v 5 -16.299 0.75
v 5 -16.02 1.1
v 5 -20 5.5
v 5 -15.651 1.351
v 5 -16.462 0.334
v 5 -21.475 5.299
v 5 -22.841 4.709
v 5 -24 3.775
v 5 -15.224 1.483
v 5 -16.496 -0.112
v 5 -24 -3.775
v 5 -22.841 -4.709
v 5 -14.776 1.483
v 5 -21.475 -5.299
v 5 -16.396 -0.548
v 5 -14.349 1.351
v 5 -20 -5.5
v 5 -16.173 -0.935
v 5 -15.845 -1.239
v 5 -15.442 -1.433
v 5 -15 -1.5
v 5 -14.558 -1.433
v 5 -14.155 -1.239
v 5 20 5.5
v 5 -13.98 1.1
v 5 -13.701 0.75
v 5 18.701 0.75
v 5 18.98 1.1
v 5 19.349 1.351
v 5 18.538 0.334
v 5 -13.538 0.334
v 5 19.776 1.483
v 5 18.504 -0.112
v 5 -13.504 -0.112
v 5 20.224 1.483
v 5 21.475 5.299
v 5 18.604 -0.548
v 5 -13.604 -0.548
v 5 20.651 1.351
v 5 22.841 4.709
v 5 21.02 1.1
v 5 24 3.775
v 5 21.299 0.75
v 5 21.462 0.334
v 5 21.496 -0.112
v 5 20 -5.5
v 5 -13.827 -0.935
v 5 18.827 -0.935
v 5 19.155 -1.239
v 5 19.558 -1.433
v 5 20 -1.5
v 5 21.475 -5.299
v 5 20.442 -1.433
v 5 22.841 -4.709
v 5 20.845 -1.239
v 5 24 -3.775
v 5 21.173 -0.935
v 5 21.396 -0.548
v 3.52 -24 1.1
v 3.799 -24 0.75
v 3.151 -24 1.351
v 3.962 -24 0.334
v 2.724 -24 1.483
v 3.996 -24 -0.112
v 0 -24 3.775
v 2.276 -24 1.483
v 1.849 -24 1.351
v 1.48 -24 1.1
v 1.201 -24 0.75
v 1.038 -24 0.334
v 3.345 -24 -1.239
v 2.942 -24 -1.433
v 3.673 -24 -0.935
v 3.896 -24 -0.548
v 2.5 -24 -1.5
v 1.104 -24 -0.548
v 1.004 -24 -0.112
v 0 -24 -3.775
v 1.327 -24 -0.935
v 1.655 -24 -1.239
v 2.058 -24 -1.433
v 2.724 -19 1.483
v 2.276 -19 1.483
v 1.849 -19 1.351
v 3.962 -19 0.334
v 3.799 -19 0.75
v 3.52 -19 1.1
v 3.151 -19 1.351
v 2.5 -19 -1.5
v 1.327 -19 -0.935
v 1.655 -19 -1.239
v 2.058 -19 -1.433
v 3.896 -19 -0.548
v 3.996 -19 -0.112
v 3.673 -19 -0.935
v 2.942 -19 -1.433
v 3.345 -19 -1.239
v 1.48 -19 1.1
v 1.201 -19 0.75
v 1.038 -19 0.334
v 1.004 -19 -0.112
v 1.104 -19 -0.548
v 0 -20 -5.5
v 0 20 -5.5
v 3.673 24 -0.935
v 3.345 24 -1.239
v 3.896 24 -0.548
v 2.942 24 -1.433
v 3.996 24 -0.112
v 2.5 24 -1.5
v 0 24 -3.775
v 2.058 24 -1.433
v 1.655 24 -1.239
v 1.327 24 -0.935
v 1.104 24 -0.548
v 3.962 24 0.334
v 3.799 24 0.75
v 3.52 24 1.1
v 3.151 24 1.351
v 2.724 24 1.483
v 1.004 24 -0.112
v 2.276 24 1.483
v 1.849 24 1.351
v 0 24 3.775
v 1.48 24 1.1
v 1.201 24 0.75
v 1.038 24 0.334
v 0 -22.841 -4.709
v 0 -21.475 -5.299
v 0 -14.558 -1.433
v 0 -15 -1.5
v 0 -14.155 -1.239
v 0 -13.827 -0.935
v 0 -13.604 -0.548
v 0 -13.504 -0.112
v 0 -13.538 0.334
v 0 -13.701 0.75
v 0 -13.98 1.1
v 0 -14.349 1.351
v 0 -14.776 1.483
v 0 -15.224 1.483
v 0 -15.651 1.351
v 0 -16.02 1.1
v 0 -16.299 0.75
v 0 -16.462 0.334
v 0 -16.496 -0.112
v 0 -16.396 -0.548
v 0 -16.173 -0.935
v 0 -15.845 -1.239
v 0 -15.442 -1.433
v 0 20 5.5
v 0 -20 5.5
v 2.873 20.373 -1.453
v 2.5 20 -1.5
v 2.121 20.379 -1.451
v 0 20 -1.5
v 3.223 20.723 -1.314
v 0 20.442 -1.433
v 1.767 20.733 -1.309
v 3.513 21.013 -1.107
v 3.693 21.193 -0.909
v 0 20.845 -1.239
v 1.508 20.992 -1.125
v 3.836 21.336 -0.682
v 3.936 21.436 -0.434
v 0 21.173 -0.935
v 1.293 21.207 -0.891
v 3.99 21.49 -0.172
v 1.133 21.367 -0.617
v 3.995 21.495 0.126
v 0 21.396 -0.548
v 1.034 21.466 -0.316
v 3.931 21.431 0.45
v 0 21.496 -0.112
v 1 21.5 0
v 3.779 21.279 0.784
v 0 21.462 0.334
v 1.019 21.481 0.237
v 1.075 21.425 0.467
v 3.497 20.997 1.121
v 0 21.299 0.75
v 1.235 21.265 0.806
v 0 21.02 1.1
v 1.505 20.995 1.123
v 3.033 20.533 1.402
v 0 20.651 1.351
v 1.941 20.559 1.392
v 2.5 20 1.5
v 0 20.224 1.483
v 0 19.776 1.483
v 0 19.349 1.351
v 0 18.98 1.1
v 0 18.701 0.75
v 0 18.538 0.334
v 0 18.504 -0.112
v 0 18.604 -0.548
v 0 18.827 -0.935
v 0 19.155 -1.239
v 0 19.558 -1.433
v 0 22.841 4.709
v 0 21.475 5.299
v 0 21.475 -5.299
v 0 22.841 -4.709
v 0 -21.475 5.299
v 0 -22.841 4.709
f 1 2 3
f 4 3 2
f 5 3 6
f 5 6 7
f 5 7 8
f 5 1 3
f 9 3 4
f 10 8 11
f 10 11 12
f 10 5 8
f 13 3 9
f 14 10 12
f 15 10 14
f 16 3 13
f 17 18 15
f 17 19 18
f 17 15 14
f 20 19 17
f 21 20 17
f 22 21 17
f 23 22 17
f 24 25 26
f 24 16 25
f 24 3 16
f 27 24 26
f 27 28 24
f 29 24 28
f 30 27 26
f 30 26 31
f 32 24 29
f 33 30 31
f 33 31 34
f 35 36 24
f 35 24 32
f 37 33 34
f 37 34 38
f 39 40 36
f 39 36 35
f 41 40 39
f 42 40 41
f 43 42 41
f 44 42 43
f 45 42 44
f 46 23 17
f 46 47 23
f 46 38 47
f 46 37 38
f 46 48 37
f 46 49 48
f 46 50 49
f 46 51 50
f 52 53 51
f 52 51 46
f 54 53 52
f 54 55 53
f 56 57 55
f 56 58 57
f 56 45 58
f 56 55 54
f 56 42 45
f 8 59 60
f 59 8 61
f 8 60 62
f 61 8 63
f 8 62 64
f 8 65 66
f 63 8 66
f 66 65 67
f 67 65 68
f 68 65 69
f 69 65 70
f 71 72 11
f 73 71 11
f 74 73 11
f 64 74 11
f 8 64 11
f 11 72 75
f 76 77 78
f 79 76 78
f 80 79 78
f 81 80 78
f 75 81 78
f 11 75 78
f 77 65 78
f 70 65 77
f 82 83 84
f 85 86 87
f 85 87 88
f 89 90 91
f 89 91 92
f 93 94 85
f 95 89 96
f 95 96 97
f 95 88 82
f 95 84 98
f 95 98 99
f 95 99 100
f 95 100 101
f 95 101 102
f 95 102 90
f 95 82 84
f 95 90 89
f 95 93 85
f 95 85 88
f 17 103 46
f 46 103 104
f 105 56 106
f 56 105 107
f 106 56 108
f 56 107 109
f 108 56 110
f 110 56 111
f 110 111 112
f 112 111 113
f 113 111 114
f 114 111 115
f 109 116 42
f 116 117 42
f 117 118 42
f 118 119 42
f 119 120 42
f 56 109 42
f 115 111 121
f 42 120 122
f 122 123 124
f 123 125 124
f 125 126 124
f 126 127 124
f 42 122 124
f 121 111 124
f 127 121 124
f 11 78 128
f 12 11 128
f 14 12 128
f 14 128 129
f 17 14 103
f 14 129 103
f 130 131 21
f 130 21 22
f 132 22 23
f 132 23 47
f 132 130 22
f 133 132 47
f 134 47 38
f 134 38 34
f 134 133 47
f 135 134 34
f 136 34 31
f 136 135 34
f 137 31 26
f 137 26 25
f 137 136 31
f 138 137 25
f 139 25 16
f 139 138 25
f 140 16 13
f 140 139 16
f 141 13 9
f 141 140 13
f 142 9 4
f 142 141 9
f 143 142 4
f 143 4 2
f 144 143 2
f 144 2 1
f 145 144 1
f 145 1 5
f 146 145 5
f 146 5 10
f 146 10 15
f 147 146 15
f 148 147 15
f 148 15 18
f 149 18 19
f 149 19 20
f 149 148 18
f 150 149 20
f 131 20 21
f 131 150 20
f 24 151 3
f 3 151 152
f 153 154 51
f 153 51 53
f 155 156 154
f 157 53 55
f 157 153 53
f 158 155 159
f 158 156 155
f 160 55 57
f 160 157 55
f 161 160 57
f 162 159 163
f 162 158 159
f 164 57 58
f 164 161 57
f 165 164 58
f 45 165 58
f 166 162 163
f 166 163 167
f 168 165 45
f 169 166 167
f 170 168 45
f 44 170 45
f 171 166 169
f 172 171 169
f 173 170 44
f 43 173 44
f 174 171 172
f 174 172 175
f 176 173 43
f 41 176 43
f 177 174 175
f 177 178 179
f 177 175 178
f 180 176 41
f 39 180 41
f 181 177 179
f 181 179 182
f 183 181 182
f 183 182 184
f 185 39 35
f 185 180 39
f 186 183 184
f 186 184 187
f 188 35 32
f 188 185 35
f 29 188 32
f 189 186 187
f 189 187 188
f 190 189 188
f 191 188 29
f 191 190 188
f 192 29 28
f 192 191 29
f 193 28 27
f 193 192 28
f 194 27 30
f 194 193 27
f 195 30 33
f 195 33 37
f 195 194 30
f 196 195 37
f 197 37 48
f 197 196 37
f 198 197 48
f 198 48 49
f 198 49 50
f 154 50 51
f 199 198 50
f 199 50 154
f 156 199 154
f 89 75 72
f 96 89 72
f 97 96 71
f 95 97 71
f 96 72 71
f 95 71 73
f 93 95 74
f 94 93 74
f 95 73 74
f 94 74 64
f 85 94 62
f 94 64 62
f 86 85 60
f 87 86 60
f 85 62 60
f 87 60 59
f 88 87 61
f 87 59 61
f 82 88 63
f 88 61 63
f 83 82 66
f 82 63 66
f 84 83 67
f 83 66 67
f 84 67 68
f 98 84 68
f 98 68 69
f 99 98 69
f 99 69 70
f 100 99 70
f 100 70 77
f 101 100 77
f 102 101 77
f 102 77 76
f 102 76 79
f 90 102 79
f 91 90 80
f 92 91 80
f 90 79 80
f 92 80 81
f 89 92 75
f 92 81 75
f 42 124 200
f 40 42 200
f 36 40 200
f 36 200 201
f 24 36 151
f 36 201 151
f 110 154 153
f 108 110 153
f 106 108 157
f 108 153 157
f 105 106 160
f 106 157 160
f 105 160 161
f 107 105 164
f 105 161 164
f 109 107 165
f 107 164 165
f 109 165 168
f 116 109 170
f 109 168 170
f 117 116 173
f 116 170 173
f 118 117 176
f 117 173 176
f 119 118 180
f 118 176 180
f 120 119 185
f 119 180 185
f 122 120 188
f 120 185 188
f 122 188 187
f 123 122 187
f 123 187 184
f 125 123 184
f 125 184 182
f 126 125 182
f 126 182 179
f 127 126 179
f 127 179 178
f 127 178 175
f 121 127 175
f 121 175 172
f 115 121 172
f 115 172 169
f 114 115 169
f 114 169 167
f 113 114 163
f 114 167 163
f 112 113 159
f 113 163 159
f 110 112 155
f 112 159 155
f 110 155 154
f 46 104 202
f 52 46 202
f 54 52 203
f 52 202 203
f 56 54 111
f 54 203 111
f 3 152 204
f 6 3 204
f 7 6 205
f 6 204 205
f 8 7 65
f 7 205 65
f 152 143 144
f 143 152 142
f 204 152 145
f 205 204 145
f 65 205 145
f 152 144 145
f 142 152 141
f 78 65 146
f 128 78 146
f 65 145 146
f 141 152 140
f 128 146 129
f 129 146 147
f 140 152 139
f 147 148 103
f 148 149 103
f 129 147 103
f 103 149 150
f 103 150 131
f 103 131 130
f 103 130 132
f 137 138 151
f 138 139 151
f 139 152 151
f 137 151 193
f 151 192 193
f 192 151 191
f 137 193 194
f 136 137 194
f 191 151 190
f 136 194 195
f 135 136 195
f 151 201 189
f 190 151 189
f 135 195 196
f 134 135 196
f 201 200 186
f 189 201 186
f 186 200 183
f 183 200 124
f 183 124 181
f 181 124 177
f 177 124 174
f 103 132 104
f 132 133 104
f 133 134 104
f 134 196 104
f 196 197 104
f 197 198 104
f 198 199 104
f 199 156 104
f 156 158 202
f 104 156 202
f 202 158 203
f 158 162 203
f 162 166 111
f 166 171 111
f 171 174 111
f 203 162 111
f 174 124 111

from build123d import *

# Parameters (mm, degrees)
SKETCH1_R           = 1.5
BOSS_EXTRUDE1_DEPTH = 5
SKETCH2_R           = 1.5
CUT_EXTRUDE1_DEPTH  = 5
CUT_EXTRUDE2_START  = -44
SKETCH2_2_R         = 1.5
CUT_EXTRUDE2_DEPTH  = 4


with BuildPart() as part:
    # Sketch1 → Boss-Extrude1 (new body)
    with BuildSketch(Plane(origin=(0, 0, 0), x_dir=(0, 0, -1), z_dir=(1, 0, 0))):
        with BuildLine():
            Line((-5.5, 20), (-5.5, -20))
            ThreePointArc((-5.5, -20), (-5.050348735, -22.178067412), (-3.774917218, -24))
            Line((-3.774917218, -24), (3.774917218, -24))
            ThreePointArc((3.774917218, -24), (5.050348735, -22.178067412), (5.5, -20))
            Line((5.5, -20), (5.5, 20))
            ThreePointArc((5.5, 20), (5.050348735, 22.178067412), (3.774917218, 24))
            Line((3.774917218, 24), (-3.774917218, 24))
            ThreePointArc((-3.774917218, 24), (-5.050348735, 22.178067412), (-5.5, 20))
        make_face()
        with Locations((0, 20)):
            Circle(SKETCH1_R, mode=Mode.SUBTRACT)
        with Locations((0, -15)):
            Circle(SKETCH1_R, mode=Mode.SUBTRACT)
    extrude(amount=BOSS_EXTRUDE1_DEPTH)

    # Sketch2 → Cut-Extrude1 (cut)
    with BuildSketch(Plane.XZ.offset(24)):
        with Locations(Location((2.5, 0, 0), (0, 0, 270))):
            Circle(SKETCH2_R)
    extrude(amount=-CUT_EXTRUDE1_DEPTH, mode=Mode.SUBTRACT)

    # Sketch2<2> → Cut-Extrude2 (cut)
    with BuildSketch(Plane.XZ.offset(24).offset(CUT_EXTRUDE2_START)):
        with Locations(Location((2.5, 0, 0), (0, 0, 270))):
            Circle(SKETCH2_2_R)
    extrude(amount=-CUT_EXTRUDE2_DEPTH, mode=Mode.SUBTRACT)


solid = part.part
